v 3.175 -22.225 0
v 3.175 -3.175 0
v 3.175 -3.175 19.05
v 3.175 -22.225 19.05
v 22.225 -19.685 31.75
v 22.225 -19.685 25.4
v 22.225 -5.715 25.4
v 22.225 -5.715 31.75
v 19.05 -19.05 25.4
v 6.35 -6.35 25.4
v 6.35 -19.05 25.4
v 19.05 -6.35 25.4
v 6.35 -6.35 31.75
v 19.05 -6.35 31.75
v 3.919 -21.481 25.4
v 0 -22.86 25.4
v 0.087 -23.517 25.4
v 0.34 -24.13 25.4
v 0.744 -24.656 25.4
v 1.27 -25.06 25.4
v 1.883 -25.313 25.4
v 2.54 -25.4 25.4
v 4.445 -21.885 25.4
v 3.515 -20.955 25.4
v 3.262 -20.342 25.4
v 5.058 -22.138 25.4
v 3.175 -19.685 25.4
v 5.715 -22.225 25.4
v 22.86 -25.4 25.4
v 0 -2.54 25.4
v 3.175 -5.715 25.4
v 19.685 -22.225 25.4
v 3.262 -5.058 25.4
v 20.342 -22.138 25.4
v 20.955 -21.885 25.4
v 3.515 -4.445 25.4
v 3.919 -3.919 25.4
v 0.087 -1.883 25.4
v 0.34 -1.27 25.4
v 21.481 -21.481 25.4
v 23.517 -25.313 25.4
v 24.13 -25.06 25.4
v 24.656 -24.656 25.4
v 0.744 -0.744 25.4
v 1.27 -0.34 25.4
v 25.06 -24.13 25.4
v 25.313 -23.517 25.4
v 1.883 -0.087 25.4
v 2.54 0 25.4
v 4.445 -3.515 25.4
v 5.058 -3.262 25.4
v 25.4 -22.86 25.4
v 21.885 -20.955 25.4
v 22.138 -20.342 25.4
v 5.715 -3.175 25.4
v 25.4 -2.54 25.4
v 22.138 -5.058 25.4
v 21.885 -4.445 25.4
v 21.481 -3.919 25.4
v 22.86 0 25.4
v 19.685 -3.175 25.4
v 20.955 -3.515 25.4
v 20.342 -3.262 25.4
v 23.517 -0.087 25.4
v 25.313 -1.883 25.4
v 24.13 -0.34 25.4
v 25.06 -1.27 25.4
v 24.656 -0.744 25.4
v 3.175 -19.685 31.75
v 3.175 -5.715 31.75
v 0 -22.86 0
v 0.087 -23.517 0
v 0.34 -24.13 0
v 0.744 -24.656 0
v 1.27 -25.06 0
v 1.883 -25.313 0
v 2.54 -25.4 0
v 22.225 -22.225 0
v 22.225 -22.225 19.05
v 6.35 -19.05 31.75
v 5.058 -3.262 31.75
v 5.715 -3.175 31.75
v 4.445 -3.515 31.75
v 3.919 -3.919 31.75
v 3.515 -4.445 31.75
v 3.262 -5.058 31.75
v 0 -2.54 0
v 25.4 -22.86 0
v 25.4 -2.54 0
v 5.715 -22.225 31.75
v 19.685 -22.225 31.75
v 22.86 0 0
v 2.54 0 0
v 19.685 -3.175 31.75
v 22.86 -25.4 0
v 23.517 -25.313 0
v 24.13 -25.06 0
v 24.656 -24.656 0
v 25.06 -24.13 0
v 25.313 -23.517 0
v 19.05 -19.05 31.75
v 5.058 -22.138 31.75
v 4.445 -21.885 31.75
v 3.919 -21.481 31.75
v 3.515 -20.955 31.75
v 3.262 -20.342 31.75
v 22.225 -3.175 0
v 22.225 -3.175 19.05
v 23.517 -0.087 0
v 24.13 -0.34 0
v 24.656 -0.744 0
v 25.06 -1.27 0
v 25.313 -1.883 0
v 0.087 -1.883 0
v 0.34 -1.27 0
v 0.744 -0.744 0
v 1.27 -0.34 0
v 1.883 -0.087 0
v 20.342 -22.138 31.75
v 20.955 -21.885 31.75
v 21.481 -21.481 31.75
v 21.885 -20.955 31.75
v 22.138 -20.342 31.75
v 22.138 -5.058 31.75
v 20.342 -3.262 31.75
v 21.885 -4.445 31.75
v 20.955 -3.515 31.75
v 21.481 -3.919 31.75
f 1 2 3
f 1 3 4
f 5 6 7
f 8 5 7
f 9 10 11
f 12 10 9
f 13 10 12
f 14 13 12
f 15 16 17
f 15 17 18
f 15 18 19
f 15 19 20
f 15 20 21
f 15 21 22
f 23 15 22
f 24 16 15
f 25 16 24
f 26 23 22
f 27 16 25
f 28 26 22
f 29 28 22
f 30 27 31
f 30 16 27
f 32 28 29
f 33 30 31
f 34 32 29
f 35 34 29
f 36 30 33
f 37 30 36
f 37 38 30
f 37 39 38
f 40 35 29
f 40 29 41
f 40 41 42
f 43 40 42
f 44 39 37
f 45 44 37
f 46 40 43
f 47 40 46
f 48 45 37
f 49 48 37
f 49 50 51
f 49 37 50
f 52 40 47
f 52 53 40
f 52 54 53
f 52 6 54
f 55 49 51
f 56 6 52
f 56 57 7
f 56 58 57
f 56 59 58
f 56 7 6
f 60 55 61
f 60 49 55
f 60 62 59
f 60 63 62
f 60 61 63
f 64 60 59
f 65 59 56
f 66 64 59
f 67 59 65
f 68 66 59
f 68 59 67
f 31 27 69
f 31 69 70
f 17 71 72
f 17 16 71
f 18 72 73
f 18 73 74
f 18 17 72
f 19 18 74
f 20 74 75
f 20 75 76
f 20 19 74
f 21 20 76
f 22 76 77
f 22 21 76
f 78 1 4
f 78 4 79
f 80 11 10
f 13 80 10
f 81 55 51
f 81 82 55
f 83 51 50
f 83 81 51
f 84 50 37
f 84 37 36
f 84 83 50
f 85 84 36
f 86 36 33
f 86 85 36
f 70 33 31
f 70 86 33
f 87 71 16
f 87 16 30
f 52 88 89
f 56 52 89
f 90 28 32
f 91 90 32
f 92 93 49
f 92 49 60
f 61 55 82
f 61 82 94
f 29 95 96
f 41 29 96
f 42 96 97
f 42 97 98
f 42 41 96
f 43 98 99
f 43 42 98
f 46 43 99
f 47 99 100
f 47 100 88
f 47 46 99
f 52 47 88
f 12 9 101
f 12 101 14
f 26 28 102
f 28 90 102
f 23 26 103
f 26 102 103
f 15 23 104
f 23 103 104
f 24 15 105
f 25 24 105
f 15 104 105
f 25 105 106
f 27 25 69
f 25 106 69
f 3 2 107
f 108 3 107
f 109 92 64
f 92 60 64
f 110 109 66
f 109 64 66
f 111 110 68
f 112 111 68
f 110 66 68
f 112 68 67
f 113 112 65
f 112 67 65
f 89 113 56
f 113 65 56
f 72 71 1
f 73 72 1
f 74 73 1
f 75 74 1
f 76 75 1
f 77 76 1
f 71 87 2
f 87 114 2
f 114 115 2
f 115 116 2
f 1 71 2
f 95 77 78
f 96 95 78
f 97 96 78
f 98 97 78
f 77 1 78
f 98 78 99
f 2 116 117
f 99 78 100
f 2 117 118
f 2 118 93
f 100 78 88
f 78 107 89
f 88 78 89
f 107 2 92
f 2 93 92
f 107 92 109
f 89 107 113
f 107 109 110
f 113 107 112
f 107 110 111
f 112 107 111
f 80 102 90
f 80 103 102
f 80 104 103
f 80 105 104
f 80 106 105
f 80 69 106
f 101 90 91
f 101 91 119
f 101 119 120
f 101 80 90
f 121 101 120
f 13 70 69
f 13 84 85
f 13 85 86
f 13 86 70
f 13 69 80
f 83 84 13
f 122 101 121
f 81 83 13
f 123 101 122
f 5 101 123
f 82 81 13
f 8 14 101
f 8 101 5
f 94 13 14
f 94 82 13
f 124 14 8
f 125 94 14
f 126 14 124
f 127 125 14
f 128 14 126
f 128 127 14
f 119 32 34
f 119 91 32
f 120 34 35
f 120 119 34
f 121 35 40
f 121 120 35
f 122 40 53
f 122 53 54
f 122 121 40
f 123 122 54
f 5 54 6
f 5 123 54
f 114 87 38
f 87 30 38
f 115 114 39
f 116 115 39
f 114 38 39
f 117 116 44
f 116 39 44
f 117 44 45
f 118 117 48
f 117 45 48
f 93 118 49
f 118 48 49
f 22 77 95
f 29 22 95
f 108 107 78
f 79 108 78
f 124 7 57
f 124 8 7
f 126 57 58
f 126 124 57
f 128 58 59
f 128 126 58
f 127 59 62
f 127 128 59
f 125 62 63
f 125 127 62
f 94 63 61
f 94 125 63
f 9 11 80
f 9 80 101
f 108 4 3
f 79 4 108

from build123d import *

# Parameters (mm, degrees)
F0_W     = 25.4
F0_H     = 25.4
F1_DEPTH = 25.4
F2_W     = 19.05
F2_H     = 19.05
F3_DEPTH = 19.05
F4_W     = 19.05
F4_H     = 19.05
F4_W_2   = 12.7
F4_H_2   = 12.7
F5_DEPTH = 6.35
F6_R     = 2.54


with BuildPart() as f1:
    # F0 (on Top) → F1 (new body)
    with BuildSketch(Plane.XY):
        with Locations((12.7, -12.7)):
            Rectangle(F0_W, F0_H)
    extrude(amount=F1_DEPTH)

    # F2 (on face) → F3 (cut)
    with BuildSketch(Plane(origin=(0, 0, 0), x_dir=(1, 0, 0), z_dir=(0, 0, -1))):
        with Locations((12.7, 12.7)):
            Rectangle(F2_W, F2_H)
    extrude(amount=-F3_DEPTH, mode=Mode.SUBTRACT)

    # F4 (on face) → F5 (join)
    with BuildSketch(Plane.XY.offset(25.4)):
        with Locations((12.7, -12.7)):
            Rectangle(F4_W, F4_H)
        with Locations((12.7, -12.7)):
            Rectangle(F4_W_2, F4_H_2, mode=Mode.SUBTRACT)
    extrude(amount=F5_DEPTH)

    # F6
    f6_edges = [f1.edges().sort_by_distance(p)[0] for p in [
        (0, 0, 12.7),
        (0, -25.4, 12.7),
        (25.4, 0, 12.7),
        (3.175, -3.175, 28.575),
        (3.175, -22.225, 28.575),
        (22.225, -3.175, 28.575),
        (22.225, -22.225, 28.575),
        (25.4, -25.4, 12.7),
    ]]
    fillet(f6_edges, radius=F6_R)


solid = f1.part
